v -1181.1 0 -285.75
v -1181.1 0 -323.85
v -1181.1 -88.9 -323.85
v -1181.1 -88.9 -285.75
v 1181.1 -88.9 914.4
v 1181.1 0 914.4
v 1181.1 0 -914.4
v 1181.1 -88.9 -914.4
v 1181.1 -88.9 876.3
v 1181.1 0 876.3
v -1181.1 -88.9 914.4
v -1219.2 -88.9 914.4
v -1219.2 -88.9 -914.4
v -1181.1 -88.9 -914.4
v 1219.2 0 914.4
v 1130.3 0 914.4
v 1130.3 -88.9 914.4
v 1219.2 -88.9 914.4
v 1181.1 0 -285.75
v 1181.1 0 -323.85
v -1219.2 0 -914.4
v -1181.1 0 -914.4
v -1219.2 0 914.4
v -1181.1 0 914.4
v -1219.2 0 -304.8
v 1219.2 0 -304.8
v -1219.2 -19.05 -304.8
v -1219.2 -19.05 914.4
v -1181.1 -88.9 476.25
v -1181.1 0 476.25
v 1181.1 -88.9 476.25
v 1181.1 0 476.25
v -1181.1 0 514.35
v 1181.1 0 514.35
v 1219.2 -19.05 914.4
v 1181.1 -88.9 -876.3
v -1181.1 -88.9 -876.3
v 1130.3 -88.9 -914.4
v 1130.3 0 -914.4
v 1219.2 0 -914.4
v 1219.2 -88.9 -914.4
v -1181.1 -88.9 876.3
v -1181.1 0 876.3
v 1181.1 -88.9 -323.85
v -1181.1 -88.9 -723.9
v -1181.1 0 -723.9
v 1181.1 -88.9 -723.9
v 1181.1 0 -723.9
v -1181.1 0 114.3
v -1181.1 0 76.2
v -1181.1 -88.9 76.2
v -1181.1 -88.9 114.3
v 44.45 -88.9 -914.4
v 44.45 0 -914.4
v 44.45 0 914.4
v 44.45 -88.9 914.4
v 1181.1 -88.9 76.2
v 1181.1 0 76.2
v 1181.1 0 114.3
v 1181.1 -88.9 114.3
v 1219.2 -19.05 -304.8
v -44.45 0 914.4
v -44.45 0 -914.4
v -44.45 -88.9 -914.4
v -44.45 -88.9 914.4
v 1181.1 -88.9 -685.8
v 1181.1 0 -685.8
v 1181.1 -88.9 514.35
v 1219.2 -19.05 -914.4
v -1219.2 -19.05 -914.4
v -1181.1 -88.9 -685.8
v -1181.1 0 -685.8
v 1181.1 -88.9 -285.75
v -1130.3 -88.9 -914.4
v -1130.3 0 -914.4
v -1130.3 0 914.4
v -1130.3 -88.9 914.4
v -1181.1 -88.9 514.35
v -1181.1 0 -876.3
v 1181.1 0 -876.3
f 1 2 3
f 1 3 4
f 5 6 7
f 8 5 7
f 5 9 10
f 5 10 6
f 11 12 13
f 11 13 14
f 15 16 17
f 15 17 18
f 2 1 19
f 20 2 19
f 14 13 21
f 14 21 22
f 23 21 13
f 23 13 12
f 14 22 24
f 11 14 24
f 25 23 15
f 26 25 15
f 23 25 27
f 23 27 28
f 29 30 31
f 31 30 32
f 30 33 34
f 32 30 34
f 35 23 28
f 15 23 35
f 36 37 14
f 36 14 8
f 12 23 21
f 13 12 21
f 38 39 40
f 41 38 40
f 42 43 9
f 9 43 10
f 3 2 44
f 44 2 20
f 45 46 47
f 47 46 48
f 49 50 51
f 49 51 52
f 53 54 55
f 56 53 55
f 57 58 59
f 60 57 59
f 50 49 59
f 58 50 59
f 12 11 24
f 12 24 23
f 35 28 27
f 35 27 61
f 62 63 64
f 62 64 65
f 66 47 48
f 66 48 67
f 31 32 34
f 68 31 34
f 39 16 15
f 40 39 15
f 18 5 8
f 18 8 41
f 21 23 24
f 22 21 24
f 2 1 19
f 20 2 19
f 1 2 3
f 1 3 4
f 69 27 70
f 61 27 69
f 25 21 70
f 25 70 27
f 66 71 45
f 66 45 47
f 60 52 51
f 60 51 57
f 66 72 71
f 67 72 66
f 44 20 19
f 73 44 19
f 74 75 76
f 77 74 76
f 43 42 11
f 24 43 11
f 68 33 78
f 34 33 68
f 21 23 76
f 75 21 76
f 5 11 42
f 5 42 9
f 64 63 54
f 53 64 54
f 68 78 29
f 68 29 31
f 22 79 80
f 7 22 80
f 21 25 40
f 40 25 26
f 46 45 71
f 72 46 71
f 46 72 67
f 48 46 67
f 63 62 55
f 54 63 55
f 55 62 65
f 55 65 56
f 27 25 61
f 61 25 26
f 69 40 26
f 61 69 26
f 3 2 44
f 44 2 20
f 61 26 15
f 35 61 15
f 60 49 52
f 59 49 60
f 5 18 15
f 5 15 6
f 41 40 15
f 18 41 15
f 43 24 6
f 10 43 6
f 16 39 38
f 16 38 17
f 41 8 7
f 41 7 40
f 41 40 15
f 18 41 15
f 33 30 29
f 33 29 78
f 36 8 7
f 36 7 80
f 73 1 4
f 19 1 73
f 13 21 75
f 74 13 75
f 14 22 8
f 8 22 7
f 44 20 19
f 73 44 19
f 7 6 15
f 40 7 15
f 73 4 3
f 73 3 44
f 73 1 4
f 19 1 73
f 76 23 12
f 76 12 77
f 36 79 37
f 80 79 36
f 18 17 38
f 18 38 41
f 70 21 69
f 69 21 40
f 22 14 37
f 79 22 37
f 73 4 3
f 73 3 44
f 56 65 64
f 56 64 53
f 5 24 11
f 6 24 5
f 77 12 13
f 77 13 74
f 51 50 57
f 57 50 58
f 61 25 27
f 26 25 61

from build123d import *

# Parameters (mm, degrees)
F1_W      = 88.9
F1_H      = 1828.8
F3_DEPTH  = 88.9
F2_W      = 2362.2
F2_H      = 38.1
F4_DEPTH  = 88.9
F5_DEPTH  = 88.9
F6_DEPTH  = 88.9
F8_DEPTH  = 88.9
F7_W      = 2438.4
F7_H      = 1219.2
F7_W_2    = 2362.2
F7_H_2    = 361.95
F9_DEPTH  = 19.05
F7_H_3    = 609.6
F10_DEPTH = 19.05


# Not quite as in the source:
# - a feature names something its author has since deleted; it is built from what else it names


with BuildPart() as f3:
    # F1 (on face) → F3 (new body)
    with BuildSketch(Plane.XZ):
        with Locations((-1174.75, 0)):
            Rectangle(F1_W, F1_H)
    extrude(amount=F3_DEPTH)


with BuildPart() as f3b:
    # F1 (on face) → F3, piece 2 (new body)
    with BuildSketch(Plane.XZ):
        Rectangle(F1_W, F1_H)
    extrude(amount=F3_DEPTH)


with BuildPart() as f3c:
    # F1 (on face) → F3, piece 3 (new body)
    with BuildSketch(Plane.XZ):
        with Locations((1174.75, 0)):
            Rectangle(F1_W, F1_H)
    extrude(amount=F3_DEPTH)


with BuildPart() as f4:
    # F2 (on face) → F4 (new body)
    with BuildSketch(Plane.XZ):
        with Locations((0, 895.35)):
            Rectangle(F2_W, F2_H)
    extrude(amount=F4_DEPTH)


with BuildPart() as f4b:
    # F2 (on face) → F4, piece 2 (new body)
    with BuildSketch(Plane.XZ):
        with Locations((0, -895.35)):
            Rectangle(F2_W, F2_H)
    extrude(amount=F4_DEPTH)


with BuildPart() as f5:
    # F2 (on face) → F5 (new body)
    with BuildSketch(Plane.XZ):
        Polygon((-1181.1, 876.3), (-1181.1, 914.4), (-1219.2, 914.4), (-1219.2, -914.4), (-1181.1, -914.4), (-1181.1, -876.3), (-1181.1, -723.9), (-1181.1, -685.8), (-1181.1, -323.85), (-1181.1, -285.75), (-1181.1, 76.2), (-1181.1, 114.3), (-1181.1, 476.25), (-1181.1, 514.35), align=None)
    extrude(amount=F5_DEPTH)


with BuildPart() as f5b:
    # F2 (on face) → F5, piece 2 (new body)
    with BuildSketch(Plane.XZ):
        Polygon((1219.2, 914.4), (1181.1, 914.4), (1181.1, 876.3), (1181.1, 514.35), (1181.1, 476.25), (1181.1, 114.3), (1181.1, 76.2), (1181.1, -285.75), (1181.1, -323.85), (1181.1, -685.8), (1181.1, -723.9), (1181.1, -876.3), (1181.1, -914.4), (1219.2, -914.4), align=None)
    extrude(amount=F5_DEPTH)


with BuildPart() as f6:
    # F2 (on face) → F6 (new body)
    with BuildSketch(Plane.XZ):
        with Locations((0, 495.3)):
            Rectangle(F2_W, F2_H)
    extrude(amount=F6_DEPTH)


with BuildPart() as f6b:
    # F2 (on face) → F6, piece 2 (new body)
    with BuildSketch(Plane.XZ):
        with Locations((0, 95.25)):
            Rectangle(F2_W, F2_H)
    extrude(amount=F6_DEPTH)


with BuildPart() as f6c:
    # F2 (on face) → F6, piece 3 (new body)
    with BuildSketch(Plane.XZ):
        with Locations((0, -304.8)):
            Rectangle(F2_W, F2_H)
    extrude(amount=F6_DEPTH)


with BuildPart() as f8:
    # F2 (on face) → F8 (new body)
    with BuildSketch(Plane.XZ):
        with Locations((0, -304.8)):
            Rectangle(F2_W, F2_H)
    extrude(amount=F8_DEPTH)


with BuildPart() as f8b:
    # F2 (on face) → F8, piece 2 (new body)
    with BuildSketch(Plane.XZ):
        with Locations((0, -704.85)):
            Rectangle(F2_W, F2_H)
    extrude(amount=F8_DEPTH)


with BuildPart() as f9:
    # F7 (on face) → F9 (new body)
    with BuildSketch(Plane.XZ):
        with Locations((0, 304.8)):
            Rectangle(F7_W, F7_H)
        with Locations((0, 295.275)):
            Rectangle(F7_W_2, F7_H_2, mode=Mode.SUBTRACT)
        with Locations((0, 295.275)):
            Rectangle(F7_W_2, F7_H_2)
    extrude(amount=F9_DEPTH)


with BuildPart() as f10:
    # F7 (on face) → F10 (new body)
    with BuildSketch(Plane.XZ):
        with Locations((0, -609.6)):
            Rectangle(F7_W, F7_H_3)
    extrude(amount=F10_DEPTH)


solid = Compound([f3.part, f3b.part, f3c.part, f4.part, f4b.part, f5.part, f5b.part, f6.part, f6b.part, f6c.part, f8.part, f8b.part, f9.part, f10.part])
